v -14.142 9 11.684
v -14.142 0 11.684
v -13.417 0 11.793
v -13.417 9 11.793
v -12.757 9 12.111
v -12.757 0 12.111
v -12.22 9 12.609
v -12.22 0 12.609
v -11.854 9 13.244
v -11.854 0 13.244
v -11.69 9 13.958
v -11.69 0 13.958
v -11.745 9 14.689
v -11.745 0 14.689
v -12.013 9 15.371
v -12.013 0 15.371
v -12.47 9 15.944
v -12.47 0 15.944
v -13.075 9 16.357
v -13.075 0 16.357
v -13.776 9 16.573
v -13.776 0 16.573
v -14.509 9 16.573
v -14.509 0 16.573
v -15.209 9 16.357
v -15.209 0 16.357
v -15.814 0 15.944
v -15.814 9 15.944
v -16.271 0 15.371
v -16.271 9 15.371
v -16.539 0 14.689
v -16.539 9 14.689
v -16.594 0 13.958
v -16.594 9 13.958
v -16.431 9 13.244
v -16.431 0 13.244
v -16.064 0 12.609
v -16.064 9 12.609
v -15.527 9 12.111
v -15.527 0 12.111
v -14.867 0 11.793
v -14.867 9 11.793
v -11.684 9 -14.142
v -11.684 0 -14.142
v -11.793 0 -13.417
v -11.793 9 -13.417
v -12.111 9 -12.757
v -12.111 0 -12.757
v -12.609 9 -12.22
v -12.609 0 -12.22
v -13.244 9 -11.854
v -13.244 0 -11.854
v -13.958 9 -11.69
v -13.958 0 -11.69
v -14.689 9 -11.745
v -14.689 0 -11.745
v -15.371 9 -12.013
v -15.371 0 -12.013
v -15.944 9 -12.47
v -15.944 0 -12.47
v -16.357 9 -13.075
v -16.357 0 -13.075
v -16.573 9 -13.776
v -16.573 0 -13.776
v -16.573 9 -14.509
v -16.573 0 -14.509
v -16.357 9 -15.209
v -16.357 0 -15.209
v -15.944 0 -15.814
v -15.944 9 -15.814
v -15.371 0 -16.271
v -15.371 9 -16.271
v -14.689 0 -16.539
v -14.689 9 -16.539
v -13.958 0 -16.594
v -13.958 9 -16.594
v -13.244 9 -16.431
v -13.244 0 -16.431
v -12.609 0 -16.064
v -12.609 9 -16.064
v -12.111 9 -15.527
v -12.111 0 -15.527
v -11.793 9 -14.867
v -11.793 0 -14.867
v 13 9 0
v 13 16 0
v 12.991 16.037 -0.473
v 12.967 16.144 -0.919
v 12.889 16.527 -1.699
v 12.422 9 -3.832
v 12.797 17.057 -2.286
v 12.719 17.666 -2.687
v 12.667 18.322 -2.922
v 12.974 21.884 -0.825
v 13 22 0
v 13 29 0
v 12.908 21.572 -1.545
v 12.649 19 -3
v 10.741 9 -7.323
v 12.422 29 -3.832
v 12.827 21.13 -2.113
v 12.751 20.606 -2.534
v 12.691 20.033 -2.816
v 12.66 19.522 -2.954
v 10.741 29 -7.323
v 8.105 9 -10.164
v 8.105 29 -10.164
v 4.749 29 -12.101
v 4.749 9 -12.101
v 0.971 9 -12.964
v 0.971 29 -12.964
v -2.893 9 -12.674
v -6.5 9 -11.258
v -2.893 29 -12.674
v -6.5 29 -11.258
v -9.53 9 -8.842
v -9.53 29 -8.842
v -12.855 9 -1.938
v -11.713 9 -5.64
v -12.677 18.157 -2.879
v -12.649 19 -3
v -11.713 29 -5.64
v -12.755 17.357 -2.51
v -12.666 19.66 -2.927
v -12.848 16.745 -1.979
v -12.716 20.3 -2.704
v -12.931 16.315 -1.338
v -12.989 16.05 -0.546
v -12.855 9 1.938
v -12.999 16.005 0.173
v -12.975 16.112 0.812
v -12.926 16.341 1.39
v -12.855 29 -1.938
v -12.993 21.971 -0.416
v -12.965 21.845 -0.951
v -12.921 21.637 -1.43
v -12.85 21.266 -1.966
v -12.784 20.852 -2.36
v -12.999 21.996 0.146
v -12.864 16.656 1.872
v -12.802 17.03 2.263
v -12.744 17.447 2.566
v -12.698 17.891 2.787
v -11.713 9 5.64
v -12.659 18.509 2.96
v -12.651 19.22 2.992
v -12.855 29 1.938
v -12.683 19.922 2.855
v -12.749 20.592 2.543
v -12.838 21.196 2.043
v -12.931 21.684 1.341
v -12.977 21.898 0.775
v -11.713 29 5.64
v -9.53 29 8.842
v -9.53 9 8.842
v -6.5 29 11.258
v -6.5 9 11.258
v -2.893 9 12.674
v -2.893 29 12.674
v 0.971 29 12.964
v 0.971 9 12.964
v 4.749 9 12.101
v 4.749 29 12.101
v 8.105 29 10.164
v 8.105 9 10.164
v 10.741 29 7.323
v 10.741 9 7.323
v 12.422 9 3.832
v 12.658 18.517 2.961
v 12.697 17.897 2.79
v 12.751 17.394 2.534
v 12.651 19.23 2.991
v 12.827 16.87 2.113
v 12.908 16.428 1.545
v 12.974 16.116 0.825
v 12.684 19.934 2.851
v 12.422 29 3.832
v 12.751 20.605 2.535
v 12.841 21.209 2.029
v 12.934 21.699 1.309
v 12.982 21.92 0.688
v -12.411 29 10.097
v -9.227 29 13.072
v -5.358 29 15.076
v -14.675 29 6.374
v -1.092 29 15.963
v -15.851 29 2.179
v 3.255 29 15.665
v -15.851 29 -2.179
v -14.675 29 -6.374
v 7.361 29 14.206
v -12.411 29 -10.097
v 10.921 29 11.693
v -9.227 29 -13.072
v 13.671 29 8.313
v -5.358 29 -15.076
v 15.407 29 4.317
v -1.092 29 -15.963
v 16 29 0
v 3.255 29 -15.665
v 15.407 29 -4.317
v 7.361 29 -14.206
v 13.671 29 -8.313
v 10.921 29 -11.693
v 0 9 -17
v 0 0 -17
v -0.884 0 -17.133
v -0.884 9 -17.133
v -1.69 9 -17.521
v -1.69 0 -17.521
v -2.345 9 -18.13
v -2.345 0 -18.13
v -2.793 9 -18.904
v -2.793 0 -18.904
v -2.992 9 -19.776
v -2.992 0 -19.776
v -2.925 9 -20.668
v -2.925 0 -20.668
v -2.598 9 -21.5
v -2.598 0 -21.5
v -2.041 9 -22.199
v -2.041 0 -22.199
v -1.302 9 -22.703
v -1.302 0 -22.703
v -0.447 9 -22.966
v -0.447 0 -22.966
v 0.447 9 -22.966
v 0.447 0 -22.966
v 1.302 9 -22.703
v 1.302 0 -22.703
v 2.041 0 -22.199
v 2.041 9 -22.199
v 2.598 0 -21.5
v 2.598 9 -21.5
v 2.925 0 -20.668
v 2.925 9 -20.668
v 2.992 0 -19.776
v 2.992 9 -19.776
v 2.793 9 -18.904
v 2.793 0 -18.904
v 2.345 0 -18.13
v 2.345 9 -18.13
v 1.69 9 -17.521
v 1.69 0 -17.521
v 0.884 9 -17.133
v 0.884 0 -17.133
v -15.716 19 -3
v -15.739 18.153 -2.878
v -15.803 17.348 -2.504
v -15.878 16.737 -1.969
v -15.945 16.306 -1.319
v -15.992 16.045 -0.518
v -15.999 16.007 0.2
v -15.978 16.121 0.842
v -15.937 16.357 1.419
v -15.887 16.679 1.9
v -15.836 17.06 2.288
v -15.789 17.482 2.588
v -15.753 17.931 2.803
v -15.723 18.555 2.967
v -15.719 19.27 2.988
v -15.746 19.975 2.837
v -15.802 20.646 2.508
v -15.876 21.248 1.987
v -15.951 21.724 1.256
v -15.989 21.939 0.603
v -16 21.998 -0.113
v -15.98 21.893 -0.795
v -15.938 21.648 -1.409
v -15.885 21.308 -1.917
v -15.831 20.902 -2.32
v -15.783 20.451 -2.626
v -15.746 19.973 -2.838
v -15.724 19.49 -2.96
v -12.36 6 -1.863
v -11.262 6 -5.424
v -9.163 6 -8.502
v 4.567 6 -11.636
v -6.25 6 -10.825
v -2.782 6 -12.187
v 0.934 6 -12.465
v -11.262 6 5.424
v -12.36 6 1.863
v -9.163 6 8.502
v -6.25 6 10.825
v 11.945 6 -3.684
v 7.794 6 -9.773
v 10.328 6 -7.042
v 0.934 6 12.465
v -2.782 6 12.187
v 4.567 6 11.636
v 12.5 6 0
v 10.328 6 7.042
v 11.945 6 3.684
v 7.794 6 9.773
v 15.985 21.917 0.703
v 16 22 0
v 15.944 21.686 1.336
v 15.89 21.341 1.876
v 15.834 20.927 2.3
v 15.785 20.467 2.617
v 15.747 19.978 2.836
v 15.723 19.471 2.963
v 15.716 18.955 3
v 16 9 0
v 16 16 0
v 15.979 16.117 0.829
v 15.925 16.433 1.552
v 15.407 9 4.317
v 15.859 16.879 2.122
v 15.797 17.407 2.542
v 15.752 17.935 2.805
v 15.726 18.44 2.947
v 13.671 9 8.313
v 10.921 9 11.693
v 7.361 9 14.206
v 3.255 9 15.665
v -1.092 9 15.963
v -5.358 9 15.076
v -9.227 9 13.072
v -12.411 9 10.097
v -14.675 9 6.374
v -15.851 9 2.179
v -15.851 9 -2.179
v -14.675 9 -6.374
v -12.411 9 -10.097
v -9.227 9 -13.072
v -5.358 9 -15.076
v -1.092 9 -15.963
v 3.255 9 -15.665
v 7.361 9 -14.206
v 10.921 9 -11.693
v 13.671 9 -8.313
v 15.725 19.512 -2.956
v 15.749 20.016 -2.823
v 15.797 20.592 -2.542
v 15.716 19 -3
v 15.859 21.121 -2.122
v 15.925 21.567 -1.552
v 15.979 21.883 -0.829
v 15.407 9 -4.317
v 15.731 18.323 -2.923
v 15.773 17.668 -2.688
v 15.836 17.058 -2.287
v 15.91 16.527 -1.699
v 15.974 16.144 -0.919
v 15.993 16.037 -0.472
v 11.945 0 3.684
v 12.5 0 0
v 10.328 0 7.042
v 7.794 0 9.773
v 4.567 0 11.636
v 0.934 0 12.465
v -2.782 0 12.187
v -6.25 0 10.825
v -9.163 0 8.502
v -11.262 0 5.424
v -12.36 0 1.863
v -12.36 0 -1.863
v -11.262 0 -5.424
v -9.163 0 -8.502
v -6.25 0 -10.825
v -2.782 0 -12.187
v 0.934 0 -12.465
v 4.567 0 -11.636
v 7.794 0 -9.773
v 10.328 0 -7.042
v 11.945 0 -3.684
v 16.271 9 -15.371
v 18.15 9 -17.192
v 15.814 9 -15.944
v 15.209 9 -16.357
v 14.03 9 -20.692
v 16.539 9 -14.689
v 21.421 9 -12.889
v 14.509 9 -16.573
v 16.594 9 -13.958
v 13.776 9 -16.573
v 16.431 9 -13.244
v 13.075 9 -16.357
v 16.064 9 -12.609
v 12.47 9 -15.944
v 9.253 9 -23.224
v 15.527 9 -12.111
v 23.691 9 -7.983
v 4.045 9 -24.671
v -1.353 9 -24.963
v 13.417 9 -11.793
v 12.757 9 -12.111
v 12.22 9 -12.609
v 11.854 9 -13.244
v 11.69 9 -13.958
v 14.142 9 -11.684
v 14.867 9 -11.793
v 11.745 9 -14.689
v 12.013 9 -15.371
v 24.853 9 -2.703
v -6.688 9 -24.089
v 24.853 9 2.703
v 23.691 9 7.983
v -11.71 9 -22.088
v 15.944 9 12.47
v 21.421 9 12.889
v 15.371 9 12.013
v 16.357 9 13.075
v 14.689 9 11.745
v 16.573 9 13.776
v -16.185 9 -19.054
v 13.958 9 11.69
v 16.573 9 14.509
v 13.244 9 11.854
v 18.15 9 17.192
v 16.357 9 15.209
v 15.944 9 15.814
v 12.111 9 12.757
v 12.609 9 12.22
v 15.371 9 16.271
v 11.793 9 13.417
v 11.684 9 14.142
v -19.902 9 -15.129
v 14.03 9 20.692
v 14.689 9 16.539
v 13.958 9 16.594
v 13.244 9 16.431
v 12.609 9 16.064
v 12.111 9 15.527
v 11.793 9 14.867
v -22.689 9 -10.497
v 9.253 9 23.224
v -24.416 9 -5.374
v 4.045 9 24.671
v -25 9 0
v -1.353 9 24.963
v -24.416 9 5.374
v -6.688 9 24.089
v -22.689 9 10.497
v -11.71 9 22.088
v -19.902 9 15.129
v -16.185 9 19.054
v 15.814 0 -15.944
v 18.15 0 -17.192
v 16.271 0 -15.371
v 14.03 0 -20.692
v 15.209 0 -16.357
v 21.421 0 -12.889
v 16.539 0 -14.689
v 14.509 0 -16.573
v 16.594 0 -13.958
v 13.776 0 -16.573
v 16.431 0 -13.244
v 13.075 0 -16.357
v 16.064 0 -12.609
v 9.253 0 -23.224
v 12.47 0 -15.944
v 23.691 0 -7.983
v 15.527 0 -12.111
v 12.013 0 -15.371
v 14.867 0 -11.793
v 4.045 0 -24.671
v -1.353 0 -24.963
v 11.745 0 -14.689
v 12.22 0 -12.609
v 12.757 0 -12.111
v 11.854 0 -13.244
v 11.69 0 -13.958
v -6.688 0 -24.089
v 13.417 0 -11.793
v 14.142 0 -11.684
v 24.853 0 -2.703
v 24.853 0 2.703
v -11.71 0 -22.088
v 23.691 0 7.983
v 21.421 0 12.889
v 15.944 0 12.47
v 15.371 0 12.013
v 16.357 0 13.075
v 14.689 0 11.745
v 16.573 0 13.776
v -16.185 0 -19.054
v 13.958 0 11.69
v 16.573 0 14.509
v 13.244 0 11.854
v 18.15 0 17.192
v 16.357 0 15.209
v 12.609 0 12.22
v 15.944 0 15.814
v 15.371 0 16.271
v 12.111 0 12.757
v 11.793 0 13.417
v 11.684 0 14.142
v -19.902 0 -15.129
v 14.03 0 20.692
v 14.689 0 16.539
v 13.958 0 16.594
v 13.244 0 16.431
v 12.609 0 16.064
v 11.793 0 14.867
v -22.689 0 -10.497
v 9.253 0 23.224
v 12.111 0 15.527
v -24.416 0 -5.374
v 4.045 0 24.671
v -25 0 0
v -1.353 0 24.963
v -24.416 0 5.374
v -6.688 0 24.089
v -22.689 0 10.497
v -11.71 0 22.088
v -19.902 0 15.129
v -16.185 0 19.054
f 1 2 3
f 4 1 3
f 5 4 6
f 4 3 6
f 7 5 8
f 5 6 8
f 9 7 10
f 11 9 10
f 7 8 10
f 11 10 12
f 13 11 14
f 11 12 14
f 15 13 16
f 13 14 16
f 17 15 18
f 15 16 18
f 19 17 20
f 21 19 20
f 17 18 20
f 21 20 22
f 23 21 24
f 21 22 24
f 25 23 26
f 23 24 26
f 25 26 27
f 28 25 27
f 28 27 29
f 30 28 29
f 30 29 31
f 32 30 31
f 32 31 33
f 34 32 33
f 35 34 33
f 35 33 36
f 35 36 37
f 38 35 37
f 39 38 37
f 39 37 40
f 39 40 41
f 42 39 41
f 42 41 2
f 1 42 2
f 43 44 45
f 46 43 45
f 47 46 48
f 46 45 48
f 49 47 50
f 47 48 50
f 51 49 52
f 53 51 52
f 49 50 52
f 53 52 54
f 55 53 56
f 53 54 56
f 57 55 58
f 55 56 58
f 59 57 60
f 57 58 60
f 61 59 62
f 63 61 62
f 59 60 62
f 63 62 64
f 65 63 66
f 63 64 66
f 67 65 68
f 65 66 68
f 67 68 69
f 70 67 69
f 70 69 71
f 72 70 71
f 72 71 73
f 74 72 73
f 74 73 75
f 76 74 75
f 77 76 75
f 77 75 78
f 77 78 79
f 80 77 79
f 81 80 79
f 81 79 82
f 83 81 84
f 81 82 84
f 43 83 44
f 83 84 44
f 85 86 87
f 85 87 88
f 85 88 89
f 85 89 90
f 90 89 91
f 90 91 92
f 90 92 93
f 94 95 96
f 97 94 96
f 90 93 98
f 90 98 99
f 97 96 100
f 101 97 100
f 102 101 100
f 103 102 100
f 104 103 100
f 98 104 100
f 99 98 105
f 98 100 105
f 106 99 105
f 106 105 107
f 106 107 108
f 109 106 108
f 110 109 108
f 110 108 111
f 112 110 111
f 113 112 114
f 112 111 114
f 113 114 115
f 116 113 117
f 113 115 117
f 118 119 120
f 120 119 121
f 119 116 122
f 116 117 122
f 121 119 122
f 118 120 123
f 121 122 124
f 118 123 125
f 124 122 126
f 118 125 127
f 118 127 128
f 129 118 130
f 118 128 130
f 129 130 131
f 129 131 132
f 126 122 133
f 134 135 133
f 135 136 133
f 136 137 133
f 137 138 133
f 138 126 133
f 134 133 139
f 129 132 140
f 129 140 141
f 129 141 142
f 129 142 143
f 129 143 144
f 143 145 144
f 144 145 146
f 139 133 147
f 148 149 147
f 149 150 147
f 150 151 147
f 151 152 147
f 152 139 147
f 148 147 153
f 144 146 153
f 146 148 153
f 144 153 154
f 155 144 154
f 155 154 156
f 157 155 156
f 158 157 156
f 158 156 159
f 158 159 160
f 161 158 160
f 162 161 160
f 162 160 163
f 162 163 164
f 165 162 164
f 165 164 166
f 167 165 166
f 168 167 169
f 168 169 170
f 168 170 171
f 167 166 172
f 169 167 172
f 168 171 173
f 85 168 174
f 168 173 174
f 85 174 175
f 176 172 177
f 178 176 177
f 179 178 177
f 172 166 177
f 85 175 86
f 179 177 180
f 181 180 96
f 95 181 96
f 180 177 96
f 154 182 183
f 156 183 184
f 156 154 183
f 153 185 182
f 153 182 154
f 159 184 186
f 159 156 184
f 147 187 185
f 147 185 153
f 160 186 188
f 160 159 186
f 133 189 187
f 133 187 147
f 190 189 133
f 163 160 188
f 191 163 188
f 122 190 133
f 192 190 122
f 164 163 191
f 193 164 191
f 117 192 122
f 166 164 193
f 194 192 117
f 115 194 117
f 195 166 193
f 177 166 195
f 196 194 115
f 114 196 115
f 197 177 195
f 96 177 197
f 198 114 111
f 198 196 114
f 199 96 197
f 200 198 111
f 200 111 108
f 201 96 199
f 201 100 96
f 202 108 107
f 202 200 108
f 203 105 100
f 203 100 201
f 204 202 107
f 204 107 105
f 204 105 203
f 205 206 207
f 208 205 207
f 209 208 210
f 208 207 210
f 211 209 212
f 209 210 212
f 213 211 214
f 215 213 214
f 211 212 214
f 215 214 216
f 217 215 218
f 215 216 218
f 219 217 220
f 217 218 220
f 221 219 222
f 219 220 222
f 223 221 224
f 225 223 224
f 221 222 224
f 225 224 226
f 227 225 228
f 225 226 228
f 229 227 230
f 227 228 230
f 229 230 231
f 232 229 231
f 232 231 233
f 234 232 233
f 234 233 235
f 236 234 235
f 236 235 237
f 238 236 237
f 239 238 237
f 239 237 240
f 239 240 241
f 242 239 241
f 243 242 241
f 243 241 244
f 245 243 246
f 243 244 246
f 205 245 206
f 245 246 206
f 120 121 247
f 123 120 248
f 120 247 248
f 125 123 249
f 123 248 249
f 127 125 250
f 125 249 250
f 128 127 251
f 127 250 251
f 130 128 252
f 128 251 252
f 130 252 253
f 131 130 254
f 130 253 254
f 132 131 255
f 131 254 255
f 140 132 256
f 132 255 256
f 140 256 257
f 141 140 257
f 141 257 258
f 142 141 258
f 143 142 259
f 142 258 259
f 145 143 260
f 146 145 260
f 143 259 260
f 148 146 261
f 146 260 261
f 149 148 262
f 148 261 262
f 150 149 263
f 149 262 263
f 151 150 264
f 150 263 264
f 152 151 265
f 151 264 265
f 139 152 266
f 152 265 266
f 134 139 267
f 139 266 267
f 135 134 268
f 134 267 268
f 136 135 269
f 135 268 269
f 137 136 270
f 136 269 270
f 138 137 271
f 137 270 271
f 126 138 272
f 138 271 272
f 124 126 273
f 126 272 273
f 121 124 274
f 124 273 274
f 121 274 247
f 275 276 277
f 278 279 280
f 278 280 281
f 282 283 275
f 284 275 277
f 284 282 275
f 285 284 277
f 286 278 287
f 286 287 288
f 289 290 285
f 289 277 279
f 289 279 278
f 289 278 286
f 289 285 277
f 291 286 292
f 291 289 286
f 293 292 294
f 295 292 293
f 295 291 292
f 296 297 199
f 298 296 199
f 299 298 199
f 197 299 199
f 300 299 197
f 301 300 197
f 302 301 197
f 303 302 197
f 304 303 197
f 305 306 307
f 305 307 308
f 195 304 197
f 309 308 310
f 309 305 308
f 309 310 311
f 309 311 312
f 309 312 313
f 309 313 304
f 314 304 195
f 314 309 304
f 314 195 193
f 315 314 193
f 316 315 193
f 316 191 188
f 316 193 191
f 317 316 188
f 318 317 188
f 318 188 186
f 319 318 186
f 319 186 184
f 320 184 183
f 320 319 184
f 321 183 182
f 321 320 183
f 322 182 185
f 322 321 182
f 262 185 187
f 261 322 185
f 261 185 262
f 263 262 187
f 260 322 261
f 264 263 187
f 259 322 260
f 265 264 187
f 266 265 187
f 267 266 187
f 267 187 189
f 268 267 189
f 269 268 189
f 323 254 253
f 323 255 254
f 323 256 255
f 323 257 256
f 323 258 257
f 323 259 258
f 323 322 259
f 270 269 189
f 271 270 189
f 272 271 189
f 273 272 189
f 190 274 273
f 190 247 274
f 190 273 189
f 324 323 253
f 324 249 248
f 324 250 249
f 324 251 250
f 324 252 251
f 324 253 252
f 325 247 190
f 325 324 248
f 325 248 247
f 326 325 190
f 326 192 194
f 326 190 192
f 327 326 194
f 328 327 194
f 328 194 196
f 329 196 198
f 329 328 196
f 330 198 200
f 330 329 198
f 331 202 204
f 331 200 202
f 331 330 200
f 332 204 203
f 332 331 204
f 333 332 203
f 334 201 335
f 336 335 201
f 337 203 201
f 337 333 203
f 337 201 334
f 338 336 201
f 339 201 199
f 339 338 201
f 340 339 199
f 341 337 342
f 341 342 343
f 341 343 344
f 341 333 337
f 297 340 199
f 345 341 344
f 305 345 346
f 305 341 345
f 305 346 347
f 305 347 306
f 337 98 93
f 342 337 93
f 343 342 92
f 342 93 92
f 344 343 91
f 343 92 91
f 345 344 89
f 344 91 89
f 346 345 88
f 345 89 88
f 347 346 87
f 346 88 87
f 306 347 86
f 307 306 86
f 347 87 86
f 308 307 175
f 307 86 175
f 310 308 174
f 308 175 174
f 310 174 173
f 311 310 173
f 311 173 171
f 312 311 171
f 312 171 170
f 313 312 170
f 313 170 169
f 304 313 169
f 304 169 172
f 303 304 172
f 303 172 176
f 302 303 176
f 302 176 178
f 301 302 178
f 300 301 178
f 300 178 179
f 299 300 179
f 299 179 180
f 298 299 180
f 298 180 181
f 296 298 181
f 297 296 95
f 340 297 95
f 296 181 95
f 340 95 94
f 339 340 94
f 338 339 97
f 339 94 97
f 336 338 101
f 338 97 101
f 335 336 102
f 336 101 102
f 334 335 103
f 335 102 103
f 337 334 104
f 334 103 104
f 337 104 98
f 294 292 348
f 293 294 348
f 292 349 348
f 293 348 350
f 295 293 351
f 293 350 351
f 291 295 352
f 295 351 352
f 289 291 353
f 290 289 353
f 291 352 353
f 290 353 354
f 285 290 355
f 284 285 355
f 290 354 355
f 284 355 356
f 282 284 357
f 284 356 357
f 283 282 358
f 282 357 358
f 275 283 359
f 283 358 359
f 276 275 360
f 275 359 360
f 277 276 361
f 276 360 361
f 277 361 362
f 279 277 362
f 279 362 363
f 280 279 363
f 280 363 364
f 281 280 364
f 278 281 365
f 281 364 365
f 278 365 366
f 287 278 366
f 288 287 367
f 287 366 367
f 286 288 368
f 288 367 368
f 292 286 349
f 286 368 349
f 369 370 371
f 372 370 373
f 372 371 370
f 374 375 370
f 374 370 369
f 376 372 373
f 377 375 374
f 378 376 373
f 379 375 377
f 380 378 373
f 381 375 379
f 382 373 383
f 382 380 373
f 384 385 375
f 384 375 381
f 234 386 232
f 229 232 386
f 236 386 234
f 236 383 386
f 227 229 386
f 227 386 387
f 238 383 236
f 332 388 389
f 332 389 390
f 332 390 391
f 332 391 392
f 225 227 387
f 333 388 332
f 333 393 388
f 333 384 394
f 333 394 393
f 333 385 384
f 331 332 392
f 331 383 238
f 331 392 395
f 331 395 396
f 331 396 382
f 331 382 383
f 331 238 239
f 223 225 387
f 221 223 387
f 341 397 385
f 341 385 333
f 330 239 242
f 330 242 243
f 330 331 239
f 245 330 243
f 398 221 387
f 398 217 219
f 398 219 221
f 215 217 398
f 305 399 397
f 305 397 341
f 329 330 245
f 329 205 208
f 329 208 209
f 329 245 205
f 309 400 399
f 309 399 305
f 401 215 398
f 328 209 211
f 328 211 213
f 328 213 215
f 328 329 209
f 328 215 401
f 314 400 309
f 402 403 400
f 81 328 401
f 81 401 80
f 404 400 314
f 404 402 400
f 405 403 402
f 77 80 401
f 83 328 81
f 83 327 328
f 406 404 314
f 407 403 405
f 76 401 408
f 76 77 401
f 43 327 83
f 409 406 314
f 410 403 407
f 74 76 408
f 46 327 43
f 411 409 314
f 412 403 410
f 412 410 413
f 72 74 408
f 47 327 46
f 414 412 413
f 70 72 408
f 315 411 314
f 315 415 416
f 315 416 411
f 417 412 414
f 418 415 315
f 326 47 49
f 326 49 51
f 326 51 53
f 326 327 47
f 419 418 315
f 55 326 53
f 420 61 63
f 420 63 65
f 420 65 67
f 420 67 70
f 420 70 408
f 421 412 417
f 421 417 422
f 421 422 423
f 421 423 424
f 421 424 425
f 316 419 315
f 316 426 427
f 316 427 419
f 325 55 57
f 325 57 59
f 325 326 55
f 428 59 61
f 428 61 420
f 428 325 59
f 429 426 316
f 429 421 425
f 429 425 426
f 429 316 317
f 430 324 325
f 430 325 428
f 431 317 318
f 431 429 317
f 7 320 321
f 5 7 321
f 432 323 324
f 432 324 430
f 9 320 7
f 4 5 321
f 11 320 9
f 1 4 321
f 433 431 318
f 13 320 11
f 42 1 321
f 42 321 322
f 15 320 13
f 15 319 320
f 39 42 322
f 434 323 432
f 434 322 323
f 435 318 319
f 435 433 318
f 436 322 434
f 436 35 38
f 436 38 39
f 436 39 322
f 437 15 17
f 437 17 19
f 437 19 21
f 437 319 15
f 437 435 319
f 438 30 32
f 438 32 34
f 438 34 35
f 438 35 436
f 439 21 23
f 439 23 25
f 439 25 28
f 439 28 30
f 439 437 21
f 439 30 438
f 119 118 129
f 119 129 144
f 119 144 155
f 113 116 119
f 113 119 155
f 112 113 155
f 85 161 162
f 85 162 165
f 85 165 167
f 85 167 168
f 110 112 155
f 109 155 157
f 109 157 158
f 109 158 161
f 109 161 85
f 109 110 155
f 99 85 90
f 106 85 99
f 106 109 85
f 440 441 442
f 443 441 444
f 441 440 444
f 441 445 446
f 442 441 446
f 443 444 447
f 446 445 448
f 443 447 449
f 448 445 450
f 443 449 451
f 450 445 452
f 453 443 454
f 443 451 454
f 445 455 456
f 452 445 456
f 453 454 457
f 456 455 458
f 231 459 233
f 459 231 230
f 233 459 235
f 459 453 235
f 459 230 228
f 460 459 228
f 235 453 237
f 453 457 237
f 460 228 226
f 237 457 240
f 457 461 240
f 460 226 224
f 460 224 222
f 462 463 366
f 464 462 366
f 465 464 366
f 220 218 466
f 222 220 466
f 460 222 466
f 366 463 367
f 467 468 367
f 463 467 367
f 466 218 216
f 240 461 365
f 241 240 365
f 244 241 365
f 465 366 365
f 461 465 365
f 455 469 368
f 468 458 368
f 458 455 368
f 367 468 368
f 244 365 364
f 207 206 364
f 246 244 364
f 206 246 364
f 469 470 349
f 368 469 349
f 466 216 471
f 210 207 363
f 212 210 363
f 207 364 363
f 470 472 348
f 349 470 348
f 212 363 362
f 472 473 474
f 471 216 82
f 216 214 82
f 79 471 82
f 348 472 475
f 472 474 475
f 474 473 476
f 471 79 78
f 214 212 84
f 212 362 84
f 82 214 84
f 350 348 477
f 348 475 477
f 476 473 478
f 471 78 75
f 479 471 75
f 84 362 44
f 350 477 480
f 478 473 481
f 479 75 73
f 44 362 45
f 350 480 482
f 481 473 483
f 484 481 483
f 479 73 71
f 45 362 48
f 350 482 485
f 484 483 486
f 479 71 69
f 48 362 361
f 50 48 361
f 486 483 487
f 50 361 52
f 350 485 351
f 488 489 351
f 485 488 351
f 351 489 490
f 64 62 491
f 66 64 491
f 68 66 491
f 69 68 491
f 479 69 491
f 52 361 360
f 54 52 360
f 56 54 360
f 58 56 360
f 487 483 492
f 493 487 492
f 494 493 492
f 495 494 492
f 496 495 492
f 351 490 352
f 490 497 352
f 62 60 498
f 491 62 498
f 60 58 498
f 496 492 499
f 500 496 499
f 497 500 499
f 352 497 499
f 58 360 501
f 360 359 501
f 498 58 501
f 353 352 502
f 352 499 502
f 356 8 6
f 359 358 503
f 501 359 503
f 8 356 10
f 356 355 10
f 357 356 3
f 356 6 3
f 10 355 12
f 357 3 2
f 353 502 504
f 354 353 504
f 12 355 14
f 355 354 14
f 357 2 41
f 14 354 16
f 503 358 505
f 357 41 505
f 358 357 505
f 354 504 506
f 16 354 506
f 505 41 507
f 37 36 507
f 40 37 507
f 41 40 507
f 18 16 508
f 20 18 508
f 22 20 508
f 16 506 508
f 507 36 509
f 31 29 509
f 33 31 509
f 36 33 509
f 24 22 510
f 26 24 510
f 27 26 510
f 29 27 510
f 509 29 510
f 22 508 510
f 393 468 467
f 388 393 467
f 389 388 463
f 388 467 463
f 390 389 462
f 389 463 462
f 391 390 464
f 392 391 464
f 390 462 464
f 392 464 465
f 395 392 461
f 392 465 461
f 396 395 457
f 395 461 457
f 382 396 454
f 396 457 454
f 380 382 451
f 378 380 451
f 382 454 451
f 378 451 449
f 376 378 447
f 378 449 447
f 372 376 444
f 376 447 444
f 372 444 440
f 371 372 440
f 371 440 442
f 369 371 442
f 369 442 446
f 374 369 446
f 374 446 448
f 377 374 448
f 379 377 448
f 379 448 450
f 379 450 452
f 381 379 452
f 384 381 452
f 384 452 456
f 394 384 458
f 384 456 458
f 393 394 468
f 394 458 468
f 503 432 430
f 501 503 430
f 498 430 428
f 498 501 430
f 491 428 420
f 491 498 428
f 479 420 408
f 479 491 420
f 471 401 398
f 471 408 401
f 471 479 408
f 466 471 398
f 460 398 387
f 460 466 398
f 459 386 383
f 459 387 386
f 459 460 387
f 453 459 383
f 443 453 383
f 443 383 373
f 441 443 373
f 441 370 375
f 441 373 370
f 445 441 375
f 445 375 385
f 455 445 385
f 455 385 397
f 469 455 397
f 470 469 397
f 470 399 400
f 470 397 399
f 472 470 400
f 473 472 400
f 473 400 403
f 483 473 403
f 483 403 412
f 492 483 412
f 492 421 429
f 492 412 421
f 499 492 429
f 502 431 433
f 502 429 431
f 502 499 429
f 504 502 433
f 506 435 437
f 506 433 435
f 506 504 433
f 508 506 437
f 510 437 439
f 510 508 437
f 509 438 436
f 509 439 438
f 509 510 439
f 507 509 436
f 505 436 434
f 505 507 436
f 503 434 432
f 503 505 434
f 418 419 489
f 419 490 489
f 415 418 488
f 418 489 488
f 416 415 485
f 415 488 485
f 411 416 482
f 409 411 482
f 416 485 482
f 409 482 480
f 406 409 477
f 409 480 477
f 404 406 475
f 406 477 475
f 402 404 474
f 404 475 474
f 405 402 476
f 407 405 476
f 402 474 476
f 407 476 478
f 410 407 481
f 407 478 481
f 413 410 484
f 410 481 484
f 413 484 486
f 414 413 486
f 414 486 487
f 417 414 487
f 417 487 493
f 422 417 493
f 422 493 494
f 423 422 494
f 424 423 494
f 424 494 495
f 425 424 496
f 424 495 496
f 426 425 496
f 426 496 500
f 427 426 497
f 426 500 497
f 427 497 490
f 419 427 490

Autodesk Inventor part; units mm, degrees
ref_plane "XZ Plane" through (0, 0, 0) normal (0, 1, 0) x (-1, 0, 0)
ref_plane "XY Plane" through (0, 0, 0) normal (0, 0, 1) x (1, 0, 0)
sketch "Sketch1" plane through (0, 0, 0) normal (0, 1, 0) x (-1, 0, 0)
  circle A0 centre (0, 0) radius 25
  dimension "d0" = 50
extrude "Extrusion1" add sketch "Sketch1" along normal blind 9
sketch "Sketch2" plane through (0, 0, 0) normal (0, -1, 0) x (1, 0, 0)
  circle A0 centre (0, 0) radius 12.5
  dimension "d3" = 25
extrude "Extrusion2" cut sketch "Sketch2" against normal blind 6
sketch "Sketch3" plane through (0, 9, 0) normal (0, 1, 0) x (1, 0, 0)
  circle A0 centre (0, 0) radius 20
  line L0 (0, 35) -> (0, -35) projected
  line L1 (0, 0) -> (14.1421, 14.1421)
  line L2 (-35, 0) -> (35, 0) projected
  point P0 (0, 20)
  dimension "d6" = 40
  dimension "d15" = 45
hole "Hole1" at (0, 9, -20) direction (0, -1, 0) diameter 6 end through all
hole "Hole2" at (14.1421, 9, -14.1421) direction (0, -1, 0) diameter 4.917 end through all thread size "M6x1" class "6H" standard "ISO Metric profile"
pattern_circular "Circular Pattern1" count 4 over 360 about axis through (0, 0, 0) along (0, 1, 0) of "Hole2"
sketch "Sketch8" plane through (0, 9, 0) normal (0, 1, 0) x (1, 0, 0)
  circle A0 centre (0, 0) radius 16
  dimension "d49" = 32
extrude "Extrusion5" add sketch "Sketch8" along normal blind 20
ref_plane "Work Plane1" through (16, 9, 0) normal (1, 0, 0) x (0, 1, 0)
sketch "Sketch15" plane through (16, 9, 0) normal (1, 0, 0) x (0, 1, 0)
  line L0 (0, -16) -> (20, -16) projected
  line L1 (20, -16) -> (20, 16) projected
  line L2 (-14.8, 0) -> (25.8, 0) projected
  point P0 (-9, 0)
  point P1 (10, 0)
  dimension "d60" = 10
  dimension "d61" = 20
hole "Hole4" at (16, 19, 0) direction (-1, 0, 0) diameter 6 end through all
sketch "Sketch16" plane through (0, 29, 0) normal (0, 1, 0) x (1, 0, 0)
  circle A0 centre (0, 0) radius 13
  circle A1 centre (0, 0) radius 16 projected
  dimension "d70" = 3
extrude "Extrusion7" cut sketch "Sketch16" against normal up to surface (20 mm away) contours A0
equation "\"d60\" = 0.5 * d61"
properties part number "Brida para herramienta"
